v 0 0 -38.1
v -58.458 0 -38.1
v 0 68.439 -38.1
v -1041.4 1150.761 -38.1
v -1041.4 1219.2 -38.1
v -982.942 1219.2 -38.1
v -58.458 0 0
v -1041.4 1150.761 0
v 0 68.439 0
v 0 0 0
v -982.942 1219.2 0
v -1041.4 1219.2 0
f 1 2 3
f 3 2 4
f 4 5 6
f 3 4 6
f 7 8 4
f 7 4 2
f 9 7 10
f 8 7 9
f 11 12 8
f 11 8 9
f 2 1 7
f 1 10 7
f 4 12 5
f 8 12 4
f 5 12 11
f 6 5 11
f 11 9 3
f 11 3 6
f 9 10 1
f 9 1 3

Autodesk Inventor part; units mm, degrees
ref_plane "YZ Plane" through (0, 0, 0) normal (1, 0, 0) x (0, 1, 0)
ref_plane "XZ Plane" through (0, 0, 0) normal (0, 1, 0) x (-1, 0, 0)
ref_plane "XY Plane" through (0, 0, 0) normal (0, 0, 1) x (1, 0, 0)
sketch "Sketch1" plane through (0, 0, 0) normal (0, 0, 1) x (1, 0, 0)
  line L0 (-1041.4, 1219.2) -> (-1041.4, 0) projected
  line L1 (-1041.4, 1219.2) -> (0, 1219.2) projected
  line L2 (0, 0) -> (0, 1219.2) projected
  line L3 (0, 0) -> (-1041.4, 0) projected
  line L4 (0, 0) -> (0, 68.4388)
  line L5 (0, 68.4388) -> (-982.9419, 1219.2)
  line L6 (-982.9419, 1219.2) -> (-1041.4, 1219.2)
  line L7 (-1041.4, 1219.2) -> (-1041.4, 1150.7612)
  line L8 (-1041.4, 1150.7612) -> (-58.4581, 0)
  line L9 (-58.4581, 0) -> (0, 0)
extrude "Extrusion1" add sketch "Sketch1" against normal blind 38.1 contours L1 L5 L2 L3 L8 L0
properties part number "44x2x4"
